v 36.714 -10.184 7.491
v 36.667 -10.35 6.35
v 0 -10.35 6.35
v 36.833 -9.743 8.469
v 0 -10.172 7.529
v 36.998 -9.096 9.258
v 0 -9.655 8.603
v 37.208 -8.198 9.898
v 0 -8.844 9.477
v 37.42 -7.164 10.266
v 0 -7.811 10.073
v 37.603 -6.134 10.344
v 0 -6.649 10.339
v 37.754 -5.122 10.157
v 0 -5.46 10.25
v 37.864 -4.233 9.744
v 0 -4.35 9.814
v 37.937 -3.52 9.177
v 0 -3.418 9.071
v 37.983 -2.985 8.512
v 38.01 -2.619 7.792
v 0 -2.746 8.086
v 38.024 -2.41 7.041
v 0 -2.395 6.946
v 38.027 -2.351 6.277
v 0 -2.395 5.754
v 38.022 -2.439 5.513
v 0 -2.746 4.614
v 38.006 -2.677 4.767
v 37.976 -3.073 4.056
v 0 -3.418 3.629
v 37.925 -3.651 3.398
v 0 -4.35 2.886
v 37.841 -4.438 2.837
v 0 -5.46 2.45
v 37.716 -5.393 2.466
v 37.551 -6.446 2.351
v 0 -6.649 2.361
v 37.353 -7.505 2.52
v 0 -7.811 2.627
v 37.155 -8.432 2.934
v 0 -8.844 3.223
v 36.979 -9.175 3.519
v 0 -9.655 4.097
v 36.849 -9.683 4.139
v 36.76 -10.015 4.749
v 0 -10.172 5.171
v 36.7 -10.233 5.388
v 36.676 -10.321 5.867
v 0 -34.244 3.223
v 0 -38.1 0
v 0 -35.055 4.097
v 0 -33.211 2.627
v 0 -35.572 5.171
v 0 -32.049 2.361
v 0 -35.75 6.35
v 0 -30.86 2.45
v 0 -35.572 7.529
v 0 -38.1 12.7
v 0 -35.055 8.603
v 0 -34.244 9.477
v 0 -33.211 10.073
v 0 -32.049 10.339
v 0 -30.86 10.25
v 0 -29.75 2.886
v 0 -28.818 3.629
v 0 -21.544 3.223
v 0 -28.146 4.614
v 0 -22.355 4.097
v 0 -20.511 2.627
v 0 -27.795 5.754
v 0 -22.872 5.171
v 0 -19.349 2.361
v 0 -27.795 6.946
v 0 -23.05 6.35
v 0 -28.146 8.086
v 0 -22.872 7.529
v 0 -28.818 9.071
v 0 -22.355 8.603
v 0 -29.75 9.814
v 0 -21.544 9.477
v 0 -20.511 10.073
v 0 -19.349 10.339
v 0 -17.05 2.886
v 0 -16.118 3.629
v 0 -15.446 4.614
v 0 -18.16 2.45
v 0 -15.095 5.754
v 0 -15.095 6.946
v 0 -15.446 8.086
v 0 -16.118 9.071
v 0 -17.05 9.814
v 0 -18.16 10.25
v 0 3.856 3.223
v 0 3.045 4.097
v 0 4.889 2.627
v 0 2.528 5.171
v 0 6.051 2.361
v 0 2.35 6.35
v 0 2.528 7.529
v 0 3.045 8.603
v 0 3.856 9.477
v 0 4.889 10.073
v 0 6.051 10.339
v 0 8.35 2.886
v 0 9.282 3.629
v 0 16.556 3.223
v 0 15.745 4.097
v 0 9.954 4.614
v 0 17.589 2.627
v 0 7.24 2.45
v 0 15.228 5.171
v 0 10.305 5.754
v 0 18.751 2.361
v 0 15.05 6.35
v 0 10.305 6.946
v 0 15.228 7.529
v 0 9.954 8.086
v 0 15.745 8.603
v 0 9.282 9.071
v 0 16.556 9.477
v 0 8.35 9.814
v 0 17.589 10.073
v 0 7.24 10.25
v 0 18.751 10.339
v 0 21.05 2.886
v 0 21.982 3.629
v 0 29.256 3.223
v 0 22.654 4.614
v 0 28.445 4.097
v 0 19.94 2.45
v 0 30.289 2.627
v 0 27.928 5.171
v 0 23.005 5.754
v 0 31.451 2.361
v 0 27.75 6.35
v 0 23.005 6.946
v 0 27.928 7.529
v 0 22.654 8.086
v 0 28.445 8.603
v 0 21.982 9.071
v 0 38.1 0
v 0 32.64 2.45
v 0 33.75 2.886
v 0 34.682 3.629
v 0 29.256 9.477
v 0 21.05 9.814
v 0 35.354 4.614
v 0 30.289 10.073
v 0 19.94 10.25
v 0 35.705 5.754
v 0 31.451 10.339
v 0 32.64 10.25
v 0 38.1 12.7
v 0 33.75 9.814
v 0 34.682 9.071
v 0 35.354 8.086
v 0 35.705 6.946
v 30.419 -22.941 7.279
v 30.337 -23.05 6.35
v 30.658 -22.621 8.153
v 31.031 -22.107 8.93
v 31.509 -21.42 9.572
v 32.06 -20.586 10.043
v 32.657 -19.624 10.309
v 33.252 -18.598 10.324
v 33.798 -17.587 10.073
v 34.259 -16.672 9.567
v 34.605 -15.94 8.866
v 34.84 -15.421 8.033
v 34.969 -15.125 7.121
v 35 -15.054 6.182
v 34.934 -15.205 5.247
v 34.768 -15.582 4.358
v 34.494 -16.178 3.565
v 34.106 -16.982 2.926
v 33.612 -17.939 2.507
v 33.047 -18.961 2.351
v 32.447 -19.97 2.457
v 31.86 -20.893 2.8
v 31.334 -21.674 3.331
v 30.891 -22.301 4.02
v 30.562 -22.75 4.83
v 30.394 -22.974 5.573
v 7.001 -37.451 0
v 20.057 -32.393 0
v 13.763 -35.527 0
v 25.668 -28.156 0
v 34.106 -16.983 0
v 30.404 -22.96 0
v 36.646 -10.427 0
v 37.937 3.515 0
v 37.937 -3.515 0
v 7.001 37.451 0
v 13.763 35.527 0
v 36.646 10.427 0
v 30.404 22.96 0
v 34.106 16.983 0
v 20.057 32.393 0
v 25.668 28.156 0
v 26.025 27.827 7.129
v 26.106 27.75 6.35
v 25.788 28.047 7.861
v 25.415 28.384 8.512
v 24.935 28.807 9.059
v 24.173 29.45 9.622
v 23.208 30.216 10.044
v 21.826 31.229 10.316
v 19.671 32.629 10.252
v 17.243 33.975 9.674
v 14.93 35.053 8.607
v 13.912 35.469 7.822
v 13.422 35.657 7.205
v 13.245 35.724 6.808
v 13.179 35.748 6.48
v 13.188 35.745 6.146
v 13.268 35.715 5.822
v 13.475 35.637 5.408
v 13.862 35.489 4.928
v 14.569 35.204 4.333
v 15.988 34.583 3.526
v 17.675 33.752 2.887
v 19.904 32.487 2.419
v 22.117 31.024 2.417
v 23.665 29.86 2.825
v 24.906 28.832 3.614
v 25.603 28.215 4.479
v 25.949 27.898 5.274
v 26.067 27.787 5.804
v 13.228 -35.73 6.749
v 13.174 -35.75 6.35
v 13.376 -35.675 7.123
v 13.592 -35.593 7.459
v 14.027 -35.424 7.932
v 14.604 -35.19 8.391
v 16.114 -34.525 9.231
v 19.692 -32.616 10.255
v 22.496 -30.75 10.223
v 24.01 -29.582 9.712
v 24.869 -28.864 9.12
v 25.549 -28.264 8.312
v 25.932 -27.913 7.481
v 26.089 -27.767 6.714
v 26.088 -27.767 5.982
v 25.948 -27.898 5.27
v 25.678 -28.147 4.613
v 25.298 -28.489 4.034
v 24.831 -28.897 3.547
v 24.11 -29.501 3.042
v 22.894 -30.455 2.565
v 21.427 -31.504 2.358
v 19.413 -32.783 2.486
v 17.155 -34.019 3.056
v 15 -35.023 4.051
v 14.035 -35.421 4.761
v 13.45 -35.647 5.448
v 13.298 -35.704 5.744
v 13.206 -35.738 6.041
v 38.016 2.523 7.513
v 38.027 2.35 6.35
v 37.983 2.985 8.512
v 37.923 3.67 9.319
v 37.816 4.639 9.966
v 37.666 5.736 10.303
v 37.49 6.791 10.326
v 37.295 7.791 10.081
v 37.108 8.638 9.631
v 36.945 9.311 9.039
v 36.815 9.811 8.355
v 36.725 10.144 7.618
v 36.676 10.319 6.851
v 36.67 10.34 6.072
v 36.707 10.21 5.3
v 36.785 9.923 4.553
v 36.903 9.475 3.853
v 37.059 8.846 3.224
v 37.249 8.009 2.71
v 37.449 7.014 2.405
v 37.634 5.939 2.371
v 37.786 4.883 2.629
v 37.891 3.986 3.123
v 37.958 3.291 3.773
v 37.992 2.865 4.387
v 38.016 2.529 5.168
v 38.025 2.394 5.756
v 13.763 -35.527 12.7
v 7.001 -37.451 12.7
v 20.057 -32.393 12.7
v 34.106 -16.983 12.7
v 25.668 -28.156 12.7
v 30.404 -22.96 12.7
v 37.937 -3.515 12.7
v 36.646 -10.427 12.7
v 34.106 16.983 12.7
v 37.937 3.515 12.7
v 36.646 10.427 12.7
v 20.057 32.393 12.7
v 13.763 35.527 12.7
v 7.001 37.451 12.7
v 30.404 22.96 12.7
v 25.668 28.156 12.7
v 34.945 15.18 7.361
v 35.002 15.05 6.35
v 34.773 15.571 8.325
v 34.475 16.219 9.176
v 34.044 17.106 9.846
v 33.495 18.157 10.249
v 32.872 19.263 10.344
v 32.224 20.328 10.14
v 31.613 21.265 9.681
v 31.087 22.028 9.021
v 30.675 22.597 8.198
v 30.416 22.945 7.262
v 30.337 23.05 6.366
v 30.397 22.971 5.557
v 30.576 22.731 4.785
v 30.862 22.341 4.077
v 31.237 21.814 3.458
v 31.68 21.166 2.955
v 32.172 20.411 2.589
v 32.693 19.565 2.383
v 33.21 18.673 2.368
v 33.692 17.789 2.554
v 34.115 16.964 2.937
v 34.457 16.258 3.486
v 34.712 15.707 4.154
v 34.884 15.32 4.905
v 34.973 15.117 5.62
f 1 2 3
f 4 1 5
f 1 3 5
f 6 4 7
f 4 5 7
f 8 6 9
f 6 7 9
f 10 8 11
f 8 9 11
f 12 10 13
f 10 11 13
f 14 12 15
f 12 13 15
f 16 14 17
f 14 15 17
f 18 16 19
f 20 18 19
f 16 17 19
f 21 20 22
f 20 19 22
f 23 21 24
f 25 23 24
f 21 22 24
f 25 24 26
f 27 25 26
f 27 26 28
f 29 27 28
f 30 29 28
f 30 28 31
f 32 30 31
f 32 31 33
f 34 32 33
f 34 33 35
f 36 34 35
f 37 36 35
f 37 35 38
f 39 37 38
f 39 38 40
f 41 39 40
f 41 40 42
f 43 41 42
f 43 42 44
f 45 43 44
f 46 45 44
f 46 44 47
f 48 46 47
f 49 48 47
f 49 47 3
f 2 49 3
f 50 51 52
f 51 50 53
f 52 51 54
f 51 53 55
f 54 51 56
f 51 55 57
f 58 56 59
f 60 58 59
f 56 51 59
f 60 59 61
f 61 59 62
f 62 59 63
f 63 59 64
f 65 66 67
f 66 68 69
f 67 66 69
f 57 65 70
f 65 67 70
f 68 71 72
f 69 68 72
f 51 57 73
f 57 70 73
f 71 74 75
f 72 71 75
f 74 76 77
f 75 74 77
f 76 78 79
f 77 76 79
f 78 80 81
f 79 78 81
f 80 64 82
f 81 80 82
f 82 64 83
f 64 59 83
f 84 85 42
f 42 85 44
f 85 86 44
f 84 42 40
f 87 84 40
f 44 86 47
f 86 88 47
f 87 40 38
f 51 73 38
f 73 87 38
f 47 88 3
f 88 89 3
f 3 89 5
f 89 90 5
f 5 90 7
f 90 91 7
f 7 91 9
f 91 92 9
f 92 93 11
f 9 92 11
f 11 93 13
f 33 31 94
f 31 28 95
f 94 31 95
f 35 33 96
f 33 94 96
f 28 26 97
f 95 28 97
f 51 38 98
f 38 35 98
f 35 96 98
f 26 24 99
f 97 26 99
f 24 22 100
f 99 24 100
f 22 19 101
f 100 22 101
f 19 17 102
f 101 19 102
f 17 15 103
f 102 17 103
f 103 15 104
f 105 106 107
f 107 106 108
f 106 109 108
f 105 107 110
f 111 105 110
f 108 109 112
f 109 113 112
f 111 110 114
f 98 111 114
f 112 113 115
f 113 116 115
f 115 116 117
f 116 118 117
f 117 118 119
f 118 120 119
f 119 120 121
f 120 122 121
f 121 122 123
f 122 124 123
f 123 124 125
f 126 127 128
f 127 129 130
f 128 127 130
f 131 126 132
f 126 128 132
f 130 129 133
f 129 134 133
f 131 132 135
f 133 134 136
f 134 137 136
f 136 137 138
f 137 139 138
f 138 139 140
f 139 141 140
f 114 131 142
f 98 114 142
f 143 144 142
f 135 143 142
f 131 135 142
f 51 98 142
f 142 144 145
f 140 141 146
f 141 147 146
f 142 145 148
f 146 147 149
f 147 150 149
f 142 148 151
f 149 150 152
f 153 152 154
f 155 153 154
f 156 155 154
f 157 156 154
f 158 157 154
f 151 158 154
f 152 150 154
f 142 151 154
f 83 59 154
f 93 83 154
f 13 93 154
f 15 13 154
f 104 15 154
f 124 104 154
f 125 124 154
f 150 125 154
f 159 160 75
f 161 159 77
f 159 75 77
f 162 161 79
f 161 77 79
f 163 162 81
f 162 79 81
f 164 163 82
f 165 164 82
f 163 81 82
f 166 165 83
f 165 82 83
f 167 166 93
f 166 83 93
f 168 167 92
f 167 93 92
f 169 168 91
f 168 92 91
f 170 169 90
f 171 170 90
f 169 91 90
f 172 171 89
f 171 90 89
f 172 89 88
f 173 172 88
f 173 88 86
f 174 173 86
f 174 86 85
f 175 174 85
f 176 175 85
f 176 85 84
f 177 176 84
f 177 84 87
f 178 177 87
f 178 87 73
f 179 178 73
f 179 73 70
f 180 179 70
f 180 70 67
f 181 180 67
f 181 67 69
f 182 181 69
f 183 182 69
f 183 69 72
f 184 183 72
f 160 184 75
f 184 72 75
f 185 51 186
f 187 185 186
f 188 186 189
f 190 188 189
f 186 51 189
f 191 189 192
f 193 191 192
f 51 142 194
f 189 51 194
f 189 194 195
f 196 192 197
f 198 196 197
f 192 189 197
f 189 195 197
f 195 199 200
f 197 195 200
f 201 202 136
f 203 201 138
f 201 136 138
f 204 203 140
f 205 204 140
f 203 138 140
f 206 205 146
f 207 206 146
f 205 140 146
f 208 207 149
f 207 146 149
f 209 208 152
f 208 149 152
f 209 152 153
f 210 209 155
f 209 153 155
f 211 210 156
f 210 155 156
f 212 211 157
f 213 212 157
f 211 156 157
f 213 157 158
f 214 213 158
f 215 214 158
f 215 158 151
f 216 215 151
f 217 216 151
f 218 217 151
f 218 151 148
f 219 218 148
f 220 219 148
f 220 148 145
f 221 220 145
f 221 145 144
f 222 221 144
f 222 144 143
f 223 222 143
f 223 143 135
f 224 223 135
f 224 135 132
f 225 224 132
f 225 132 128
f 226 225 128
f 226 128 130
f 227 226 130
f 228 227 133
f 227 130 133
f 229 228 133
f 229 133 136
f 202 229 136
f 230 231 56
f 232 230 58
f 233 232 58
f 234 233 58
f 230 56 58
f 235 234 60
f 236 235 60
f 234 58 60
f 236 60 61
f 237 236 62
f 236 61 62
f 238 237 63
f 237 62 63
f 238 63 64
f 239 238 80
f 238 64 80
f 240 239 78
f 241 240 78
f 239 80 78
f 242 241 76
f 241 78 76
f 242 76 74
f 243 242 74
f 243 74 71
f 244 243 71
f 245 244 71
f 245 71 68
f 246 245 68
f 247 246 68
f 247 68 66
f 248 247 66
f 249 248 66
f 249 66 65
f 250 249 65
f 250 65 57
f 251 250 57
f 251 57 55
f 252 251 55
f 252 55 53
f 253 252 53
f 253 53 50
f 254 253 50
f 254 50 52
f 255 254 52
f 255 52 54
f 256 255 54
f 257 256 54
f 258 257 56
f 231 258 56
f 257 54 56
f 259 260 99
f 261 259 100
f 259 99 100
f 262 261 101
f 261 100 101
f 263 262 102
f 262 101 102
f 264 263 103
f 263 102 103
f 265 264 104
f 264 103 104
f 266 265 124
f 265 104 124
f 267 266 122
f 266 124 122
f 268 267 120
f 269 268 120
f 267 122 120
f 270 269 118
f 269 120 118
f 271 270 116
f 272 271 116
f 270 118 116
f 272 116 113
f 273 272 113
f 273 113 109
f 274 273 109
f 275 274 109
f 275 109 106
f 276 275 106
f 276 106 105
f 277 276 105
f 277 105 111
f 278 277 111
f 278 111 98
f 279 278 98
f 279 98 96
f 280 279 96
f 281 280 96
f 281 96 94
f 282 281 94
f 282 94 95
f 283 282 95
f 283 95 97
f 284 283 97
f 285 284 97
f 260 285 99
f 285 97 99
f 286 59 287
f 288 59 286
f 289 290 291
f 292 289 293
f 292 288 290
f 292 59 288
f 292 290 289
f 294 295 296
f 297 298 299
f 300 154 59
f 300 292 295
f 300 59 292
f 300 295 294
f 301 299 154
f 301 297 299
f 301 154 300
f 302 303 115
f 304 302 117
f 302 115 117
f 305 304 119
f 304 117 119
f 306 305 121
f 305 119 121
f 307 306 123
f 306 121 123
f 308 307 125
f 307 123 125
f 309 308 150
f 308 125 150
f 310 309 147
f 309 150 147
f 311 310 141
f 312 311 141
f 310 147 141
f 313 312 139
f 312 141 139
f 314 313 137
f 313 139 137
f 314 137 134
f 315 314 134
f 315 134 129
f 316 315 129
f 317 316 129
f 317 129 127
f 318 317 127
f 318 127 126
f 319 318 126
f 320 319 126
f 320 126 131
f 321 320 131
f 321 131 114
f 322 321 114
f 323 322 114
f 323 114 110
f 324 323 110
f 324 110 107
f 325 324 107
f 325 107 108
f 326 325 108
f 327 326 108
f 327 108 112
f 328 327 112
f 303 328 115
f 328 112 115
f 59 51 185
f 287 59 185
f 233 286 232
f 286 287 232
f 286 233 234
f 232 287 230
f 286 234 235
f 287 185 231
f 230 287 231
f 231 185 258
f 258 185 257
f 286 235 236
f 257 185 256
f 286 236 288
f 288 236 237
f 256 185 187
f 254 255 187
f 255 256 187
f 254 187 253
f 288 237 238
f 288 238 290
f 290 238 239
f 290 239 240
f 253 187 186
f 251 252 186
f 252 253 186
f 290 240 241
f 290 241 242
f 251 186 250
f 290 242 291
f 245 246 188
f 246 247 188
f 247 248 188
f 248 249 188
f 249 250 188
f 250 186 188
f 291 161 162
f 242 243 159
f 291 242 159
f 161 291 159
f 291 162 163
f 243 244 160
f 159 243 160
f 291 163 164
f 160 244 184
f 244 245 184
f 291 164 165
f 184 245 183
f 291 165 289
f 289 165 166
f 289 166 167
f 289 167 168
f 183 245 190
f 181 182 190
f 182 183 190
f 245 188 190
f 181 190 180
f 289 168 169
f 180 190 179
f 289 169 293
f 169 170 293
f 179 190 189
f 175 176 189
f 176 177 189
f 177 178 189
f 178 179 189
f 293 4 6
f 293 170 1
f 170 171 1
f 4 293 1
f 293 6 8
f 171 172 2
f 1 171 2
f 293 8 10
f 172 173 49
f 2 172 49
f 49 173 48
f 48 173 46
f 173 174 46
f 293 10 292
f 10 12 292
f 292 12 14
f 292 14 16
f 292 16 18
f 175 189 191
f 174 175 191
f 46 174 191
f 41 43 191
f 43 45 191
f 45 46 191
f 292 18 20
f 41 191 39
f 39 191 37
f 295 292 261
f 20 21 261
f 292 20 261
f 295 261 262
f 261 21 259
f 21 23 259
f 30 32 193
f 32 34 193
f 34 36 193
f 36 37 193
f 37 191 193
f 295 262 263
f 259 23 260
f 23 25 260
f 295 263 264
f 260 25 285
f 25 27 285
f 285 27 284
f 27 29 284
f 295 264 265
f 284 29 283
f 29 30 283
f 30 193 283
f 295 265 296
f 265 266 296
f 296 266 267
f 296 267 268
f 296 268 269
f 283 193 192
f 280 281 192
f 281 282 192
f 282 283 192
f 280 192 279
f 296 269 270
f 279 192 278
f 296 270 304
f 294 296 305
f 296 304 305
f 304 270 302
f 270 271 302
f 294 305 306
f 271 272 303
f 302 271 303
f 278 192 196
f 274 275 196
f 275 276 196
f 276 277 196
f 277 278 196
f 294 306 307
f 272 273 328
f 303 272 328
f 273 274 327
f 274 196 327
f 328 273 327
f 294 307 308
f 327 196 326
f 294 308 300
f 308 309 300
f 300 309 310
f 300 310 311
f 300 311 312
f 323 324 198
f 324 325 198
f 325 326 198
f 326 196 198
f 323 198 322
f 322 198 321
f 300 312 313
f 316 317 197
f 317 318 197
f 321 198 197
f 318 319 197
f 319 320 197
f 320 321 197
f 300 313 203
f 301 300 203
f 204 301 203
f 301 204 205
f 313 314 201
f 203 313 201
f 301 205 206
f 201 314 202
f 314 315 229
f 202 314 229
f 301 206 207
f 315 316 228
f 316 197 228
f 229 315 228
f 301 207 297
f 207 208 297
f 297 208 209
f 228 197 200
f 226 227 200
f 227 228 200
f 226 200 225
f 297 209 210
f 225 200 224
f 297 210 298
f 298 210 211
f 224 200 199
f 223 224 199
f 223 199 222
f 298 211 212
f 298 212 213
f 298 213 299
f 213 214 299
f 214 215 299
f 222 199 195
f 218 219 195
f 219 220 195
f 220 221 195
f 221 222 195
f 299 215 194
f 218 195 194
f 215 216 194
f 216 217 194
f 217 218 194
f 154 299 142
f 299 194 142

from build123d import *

# Parameters (mm, degrees)
F0_R     = 38.1
F1_DEPTH = 12.7
F2_W     = 42.448588
F2_H     = 91.320313
F3_DEPTH = 12.7
F4_R     = 4
F5_DEPTH = 38.101


with BuildPart() as f1:
    # F0 (on Top) → F1 (new body)
    with BuildSketch(Plane.XY):
        Circle(F0_R)
    extrude(amount=F1_DEPTH)

    # F2 (on face) → F3 (cut, through all)
    with BuildSketch(Plane.XY.offset(12.7)):
        with Locations((-21.224294, 1.396335)):
            Rectangle(F2_W, F2_H)
    extrude(amount=-F3_DEPTH, mode=Mode.SUBTRACT)

    # F4 (on face) → F5 (cut, through all)
    with BuildSketch(Plane(origin=(0, 0, 0), x_dir=(0, -1, 0), z_dir=(-1, 0, 0))):
        with Locations((-31.75, 6.35)):
            Circle(F4_R)
        with Locations((-19.05, 6.35)):
            Circle(F4_R)
        with Locations((-6.35, 6.35)):
            Circle(F4_R)
        with Locations((6.35, 6.35)):
            Circle(F4_R)
        with Locations((19.05, 6.35)):
            Circle(F4_R)
        with Locations((31.75, 6.35)):
            Circle(F4_R)
    extrude(amount=-F5_DEPTH, mode=Mode.SUBTRACT)


solid = f1.part
